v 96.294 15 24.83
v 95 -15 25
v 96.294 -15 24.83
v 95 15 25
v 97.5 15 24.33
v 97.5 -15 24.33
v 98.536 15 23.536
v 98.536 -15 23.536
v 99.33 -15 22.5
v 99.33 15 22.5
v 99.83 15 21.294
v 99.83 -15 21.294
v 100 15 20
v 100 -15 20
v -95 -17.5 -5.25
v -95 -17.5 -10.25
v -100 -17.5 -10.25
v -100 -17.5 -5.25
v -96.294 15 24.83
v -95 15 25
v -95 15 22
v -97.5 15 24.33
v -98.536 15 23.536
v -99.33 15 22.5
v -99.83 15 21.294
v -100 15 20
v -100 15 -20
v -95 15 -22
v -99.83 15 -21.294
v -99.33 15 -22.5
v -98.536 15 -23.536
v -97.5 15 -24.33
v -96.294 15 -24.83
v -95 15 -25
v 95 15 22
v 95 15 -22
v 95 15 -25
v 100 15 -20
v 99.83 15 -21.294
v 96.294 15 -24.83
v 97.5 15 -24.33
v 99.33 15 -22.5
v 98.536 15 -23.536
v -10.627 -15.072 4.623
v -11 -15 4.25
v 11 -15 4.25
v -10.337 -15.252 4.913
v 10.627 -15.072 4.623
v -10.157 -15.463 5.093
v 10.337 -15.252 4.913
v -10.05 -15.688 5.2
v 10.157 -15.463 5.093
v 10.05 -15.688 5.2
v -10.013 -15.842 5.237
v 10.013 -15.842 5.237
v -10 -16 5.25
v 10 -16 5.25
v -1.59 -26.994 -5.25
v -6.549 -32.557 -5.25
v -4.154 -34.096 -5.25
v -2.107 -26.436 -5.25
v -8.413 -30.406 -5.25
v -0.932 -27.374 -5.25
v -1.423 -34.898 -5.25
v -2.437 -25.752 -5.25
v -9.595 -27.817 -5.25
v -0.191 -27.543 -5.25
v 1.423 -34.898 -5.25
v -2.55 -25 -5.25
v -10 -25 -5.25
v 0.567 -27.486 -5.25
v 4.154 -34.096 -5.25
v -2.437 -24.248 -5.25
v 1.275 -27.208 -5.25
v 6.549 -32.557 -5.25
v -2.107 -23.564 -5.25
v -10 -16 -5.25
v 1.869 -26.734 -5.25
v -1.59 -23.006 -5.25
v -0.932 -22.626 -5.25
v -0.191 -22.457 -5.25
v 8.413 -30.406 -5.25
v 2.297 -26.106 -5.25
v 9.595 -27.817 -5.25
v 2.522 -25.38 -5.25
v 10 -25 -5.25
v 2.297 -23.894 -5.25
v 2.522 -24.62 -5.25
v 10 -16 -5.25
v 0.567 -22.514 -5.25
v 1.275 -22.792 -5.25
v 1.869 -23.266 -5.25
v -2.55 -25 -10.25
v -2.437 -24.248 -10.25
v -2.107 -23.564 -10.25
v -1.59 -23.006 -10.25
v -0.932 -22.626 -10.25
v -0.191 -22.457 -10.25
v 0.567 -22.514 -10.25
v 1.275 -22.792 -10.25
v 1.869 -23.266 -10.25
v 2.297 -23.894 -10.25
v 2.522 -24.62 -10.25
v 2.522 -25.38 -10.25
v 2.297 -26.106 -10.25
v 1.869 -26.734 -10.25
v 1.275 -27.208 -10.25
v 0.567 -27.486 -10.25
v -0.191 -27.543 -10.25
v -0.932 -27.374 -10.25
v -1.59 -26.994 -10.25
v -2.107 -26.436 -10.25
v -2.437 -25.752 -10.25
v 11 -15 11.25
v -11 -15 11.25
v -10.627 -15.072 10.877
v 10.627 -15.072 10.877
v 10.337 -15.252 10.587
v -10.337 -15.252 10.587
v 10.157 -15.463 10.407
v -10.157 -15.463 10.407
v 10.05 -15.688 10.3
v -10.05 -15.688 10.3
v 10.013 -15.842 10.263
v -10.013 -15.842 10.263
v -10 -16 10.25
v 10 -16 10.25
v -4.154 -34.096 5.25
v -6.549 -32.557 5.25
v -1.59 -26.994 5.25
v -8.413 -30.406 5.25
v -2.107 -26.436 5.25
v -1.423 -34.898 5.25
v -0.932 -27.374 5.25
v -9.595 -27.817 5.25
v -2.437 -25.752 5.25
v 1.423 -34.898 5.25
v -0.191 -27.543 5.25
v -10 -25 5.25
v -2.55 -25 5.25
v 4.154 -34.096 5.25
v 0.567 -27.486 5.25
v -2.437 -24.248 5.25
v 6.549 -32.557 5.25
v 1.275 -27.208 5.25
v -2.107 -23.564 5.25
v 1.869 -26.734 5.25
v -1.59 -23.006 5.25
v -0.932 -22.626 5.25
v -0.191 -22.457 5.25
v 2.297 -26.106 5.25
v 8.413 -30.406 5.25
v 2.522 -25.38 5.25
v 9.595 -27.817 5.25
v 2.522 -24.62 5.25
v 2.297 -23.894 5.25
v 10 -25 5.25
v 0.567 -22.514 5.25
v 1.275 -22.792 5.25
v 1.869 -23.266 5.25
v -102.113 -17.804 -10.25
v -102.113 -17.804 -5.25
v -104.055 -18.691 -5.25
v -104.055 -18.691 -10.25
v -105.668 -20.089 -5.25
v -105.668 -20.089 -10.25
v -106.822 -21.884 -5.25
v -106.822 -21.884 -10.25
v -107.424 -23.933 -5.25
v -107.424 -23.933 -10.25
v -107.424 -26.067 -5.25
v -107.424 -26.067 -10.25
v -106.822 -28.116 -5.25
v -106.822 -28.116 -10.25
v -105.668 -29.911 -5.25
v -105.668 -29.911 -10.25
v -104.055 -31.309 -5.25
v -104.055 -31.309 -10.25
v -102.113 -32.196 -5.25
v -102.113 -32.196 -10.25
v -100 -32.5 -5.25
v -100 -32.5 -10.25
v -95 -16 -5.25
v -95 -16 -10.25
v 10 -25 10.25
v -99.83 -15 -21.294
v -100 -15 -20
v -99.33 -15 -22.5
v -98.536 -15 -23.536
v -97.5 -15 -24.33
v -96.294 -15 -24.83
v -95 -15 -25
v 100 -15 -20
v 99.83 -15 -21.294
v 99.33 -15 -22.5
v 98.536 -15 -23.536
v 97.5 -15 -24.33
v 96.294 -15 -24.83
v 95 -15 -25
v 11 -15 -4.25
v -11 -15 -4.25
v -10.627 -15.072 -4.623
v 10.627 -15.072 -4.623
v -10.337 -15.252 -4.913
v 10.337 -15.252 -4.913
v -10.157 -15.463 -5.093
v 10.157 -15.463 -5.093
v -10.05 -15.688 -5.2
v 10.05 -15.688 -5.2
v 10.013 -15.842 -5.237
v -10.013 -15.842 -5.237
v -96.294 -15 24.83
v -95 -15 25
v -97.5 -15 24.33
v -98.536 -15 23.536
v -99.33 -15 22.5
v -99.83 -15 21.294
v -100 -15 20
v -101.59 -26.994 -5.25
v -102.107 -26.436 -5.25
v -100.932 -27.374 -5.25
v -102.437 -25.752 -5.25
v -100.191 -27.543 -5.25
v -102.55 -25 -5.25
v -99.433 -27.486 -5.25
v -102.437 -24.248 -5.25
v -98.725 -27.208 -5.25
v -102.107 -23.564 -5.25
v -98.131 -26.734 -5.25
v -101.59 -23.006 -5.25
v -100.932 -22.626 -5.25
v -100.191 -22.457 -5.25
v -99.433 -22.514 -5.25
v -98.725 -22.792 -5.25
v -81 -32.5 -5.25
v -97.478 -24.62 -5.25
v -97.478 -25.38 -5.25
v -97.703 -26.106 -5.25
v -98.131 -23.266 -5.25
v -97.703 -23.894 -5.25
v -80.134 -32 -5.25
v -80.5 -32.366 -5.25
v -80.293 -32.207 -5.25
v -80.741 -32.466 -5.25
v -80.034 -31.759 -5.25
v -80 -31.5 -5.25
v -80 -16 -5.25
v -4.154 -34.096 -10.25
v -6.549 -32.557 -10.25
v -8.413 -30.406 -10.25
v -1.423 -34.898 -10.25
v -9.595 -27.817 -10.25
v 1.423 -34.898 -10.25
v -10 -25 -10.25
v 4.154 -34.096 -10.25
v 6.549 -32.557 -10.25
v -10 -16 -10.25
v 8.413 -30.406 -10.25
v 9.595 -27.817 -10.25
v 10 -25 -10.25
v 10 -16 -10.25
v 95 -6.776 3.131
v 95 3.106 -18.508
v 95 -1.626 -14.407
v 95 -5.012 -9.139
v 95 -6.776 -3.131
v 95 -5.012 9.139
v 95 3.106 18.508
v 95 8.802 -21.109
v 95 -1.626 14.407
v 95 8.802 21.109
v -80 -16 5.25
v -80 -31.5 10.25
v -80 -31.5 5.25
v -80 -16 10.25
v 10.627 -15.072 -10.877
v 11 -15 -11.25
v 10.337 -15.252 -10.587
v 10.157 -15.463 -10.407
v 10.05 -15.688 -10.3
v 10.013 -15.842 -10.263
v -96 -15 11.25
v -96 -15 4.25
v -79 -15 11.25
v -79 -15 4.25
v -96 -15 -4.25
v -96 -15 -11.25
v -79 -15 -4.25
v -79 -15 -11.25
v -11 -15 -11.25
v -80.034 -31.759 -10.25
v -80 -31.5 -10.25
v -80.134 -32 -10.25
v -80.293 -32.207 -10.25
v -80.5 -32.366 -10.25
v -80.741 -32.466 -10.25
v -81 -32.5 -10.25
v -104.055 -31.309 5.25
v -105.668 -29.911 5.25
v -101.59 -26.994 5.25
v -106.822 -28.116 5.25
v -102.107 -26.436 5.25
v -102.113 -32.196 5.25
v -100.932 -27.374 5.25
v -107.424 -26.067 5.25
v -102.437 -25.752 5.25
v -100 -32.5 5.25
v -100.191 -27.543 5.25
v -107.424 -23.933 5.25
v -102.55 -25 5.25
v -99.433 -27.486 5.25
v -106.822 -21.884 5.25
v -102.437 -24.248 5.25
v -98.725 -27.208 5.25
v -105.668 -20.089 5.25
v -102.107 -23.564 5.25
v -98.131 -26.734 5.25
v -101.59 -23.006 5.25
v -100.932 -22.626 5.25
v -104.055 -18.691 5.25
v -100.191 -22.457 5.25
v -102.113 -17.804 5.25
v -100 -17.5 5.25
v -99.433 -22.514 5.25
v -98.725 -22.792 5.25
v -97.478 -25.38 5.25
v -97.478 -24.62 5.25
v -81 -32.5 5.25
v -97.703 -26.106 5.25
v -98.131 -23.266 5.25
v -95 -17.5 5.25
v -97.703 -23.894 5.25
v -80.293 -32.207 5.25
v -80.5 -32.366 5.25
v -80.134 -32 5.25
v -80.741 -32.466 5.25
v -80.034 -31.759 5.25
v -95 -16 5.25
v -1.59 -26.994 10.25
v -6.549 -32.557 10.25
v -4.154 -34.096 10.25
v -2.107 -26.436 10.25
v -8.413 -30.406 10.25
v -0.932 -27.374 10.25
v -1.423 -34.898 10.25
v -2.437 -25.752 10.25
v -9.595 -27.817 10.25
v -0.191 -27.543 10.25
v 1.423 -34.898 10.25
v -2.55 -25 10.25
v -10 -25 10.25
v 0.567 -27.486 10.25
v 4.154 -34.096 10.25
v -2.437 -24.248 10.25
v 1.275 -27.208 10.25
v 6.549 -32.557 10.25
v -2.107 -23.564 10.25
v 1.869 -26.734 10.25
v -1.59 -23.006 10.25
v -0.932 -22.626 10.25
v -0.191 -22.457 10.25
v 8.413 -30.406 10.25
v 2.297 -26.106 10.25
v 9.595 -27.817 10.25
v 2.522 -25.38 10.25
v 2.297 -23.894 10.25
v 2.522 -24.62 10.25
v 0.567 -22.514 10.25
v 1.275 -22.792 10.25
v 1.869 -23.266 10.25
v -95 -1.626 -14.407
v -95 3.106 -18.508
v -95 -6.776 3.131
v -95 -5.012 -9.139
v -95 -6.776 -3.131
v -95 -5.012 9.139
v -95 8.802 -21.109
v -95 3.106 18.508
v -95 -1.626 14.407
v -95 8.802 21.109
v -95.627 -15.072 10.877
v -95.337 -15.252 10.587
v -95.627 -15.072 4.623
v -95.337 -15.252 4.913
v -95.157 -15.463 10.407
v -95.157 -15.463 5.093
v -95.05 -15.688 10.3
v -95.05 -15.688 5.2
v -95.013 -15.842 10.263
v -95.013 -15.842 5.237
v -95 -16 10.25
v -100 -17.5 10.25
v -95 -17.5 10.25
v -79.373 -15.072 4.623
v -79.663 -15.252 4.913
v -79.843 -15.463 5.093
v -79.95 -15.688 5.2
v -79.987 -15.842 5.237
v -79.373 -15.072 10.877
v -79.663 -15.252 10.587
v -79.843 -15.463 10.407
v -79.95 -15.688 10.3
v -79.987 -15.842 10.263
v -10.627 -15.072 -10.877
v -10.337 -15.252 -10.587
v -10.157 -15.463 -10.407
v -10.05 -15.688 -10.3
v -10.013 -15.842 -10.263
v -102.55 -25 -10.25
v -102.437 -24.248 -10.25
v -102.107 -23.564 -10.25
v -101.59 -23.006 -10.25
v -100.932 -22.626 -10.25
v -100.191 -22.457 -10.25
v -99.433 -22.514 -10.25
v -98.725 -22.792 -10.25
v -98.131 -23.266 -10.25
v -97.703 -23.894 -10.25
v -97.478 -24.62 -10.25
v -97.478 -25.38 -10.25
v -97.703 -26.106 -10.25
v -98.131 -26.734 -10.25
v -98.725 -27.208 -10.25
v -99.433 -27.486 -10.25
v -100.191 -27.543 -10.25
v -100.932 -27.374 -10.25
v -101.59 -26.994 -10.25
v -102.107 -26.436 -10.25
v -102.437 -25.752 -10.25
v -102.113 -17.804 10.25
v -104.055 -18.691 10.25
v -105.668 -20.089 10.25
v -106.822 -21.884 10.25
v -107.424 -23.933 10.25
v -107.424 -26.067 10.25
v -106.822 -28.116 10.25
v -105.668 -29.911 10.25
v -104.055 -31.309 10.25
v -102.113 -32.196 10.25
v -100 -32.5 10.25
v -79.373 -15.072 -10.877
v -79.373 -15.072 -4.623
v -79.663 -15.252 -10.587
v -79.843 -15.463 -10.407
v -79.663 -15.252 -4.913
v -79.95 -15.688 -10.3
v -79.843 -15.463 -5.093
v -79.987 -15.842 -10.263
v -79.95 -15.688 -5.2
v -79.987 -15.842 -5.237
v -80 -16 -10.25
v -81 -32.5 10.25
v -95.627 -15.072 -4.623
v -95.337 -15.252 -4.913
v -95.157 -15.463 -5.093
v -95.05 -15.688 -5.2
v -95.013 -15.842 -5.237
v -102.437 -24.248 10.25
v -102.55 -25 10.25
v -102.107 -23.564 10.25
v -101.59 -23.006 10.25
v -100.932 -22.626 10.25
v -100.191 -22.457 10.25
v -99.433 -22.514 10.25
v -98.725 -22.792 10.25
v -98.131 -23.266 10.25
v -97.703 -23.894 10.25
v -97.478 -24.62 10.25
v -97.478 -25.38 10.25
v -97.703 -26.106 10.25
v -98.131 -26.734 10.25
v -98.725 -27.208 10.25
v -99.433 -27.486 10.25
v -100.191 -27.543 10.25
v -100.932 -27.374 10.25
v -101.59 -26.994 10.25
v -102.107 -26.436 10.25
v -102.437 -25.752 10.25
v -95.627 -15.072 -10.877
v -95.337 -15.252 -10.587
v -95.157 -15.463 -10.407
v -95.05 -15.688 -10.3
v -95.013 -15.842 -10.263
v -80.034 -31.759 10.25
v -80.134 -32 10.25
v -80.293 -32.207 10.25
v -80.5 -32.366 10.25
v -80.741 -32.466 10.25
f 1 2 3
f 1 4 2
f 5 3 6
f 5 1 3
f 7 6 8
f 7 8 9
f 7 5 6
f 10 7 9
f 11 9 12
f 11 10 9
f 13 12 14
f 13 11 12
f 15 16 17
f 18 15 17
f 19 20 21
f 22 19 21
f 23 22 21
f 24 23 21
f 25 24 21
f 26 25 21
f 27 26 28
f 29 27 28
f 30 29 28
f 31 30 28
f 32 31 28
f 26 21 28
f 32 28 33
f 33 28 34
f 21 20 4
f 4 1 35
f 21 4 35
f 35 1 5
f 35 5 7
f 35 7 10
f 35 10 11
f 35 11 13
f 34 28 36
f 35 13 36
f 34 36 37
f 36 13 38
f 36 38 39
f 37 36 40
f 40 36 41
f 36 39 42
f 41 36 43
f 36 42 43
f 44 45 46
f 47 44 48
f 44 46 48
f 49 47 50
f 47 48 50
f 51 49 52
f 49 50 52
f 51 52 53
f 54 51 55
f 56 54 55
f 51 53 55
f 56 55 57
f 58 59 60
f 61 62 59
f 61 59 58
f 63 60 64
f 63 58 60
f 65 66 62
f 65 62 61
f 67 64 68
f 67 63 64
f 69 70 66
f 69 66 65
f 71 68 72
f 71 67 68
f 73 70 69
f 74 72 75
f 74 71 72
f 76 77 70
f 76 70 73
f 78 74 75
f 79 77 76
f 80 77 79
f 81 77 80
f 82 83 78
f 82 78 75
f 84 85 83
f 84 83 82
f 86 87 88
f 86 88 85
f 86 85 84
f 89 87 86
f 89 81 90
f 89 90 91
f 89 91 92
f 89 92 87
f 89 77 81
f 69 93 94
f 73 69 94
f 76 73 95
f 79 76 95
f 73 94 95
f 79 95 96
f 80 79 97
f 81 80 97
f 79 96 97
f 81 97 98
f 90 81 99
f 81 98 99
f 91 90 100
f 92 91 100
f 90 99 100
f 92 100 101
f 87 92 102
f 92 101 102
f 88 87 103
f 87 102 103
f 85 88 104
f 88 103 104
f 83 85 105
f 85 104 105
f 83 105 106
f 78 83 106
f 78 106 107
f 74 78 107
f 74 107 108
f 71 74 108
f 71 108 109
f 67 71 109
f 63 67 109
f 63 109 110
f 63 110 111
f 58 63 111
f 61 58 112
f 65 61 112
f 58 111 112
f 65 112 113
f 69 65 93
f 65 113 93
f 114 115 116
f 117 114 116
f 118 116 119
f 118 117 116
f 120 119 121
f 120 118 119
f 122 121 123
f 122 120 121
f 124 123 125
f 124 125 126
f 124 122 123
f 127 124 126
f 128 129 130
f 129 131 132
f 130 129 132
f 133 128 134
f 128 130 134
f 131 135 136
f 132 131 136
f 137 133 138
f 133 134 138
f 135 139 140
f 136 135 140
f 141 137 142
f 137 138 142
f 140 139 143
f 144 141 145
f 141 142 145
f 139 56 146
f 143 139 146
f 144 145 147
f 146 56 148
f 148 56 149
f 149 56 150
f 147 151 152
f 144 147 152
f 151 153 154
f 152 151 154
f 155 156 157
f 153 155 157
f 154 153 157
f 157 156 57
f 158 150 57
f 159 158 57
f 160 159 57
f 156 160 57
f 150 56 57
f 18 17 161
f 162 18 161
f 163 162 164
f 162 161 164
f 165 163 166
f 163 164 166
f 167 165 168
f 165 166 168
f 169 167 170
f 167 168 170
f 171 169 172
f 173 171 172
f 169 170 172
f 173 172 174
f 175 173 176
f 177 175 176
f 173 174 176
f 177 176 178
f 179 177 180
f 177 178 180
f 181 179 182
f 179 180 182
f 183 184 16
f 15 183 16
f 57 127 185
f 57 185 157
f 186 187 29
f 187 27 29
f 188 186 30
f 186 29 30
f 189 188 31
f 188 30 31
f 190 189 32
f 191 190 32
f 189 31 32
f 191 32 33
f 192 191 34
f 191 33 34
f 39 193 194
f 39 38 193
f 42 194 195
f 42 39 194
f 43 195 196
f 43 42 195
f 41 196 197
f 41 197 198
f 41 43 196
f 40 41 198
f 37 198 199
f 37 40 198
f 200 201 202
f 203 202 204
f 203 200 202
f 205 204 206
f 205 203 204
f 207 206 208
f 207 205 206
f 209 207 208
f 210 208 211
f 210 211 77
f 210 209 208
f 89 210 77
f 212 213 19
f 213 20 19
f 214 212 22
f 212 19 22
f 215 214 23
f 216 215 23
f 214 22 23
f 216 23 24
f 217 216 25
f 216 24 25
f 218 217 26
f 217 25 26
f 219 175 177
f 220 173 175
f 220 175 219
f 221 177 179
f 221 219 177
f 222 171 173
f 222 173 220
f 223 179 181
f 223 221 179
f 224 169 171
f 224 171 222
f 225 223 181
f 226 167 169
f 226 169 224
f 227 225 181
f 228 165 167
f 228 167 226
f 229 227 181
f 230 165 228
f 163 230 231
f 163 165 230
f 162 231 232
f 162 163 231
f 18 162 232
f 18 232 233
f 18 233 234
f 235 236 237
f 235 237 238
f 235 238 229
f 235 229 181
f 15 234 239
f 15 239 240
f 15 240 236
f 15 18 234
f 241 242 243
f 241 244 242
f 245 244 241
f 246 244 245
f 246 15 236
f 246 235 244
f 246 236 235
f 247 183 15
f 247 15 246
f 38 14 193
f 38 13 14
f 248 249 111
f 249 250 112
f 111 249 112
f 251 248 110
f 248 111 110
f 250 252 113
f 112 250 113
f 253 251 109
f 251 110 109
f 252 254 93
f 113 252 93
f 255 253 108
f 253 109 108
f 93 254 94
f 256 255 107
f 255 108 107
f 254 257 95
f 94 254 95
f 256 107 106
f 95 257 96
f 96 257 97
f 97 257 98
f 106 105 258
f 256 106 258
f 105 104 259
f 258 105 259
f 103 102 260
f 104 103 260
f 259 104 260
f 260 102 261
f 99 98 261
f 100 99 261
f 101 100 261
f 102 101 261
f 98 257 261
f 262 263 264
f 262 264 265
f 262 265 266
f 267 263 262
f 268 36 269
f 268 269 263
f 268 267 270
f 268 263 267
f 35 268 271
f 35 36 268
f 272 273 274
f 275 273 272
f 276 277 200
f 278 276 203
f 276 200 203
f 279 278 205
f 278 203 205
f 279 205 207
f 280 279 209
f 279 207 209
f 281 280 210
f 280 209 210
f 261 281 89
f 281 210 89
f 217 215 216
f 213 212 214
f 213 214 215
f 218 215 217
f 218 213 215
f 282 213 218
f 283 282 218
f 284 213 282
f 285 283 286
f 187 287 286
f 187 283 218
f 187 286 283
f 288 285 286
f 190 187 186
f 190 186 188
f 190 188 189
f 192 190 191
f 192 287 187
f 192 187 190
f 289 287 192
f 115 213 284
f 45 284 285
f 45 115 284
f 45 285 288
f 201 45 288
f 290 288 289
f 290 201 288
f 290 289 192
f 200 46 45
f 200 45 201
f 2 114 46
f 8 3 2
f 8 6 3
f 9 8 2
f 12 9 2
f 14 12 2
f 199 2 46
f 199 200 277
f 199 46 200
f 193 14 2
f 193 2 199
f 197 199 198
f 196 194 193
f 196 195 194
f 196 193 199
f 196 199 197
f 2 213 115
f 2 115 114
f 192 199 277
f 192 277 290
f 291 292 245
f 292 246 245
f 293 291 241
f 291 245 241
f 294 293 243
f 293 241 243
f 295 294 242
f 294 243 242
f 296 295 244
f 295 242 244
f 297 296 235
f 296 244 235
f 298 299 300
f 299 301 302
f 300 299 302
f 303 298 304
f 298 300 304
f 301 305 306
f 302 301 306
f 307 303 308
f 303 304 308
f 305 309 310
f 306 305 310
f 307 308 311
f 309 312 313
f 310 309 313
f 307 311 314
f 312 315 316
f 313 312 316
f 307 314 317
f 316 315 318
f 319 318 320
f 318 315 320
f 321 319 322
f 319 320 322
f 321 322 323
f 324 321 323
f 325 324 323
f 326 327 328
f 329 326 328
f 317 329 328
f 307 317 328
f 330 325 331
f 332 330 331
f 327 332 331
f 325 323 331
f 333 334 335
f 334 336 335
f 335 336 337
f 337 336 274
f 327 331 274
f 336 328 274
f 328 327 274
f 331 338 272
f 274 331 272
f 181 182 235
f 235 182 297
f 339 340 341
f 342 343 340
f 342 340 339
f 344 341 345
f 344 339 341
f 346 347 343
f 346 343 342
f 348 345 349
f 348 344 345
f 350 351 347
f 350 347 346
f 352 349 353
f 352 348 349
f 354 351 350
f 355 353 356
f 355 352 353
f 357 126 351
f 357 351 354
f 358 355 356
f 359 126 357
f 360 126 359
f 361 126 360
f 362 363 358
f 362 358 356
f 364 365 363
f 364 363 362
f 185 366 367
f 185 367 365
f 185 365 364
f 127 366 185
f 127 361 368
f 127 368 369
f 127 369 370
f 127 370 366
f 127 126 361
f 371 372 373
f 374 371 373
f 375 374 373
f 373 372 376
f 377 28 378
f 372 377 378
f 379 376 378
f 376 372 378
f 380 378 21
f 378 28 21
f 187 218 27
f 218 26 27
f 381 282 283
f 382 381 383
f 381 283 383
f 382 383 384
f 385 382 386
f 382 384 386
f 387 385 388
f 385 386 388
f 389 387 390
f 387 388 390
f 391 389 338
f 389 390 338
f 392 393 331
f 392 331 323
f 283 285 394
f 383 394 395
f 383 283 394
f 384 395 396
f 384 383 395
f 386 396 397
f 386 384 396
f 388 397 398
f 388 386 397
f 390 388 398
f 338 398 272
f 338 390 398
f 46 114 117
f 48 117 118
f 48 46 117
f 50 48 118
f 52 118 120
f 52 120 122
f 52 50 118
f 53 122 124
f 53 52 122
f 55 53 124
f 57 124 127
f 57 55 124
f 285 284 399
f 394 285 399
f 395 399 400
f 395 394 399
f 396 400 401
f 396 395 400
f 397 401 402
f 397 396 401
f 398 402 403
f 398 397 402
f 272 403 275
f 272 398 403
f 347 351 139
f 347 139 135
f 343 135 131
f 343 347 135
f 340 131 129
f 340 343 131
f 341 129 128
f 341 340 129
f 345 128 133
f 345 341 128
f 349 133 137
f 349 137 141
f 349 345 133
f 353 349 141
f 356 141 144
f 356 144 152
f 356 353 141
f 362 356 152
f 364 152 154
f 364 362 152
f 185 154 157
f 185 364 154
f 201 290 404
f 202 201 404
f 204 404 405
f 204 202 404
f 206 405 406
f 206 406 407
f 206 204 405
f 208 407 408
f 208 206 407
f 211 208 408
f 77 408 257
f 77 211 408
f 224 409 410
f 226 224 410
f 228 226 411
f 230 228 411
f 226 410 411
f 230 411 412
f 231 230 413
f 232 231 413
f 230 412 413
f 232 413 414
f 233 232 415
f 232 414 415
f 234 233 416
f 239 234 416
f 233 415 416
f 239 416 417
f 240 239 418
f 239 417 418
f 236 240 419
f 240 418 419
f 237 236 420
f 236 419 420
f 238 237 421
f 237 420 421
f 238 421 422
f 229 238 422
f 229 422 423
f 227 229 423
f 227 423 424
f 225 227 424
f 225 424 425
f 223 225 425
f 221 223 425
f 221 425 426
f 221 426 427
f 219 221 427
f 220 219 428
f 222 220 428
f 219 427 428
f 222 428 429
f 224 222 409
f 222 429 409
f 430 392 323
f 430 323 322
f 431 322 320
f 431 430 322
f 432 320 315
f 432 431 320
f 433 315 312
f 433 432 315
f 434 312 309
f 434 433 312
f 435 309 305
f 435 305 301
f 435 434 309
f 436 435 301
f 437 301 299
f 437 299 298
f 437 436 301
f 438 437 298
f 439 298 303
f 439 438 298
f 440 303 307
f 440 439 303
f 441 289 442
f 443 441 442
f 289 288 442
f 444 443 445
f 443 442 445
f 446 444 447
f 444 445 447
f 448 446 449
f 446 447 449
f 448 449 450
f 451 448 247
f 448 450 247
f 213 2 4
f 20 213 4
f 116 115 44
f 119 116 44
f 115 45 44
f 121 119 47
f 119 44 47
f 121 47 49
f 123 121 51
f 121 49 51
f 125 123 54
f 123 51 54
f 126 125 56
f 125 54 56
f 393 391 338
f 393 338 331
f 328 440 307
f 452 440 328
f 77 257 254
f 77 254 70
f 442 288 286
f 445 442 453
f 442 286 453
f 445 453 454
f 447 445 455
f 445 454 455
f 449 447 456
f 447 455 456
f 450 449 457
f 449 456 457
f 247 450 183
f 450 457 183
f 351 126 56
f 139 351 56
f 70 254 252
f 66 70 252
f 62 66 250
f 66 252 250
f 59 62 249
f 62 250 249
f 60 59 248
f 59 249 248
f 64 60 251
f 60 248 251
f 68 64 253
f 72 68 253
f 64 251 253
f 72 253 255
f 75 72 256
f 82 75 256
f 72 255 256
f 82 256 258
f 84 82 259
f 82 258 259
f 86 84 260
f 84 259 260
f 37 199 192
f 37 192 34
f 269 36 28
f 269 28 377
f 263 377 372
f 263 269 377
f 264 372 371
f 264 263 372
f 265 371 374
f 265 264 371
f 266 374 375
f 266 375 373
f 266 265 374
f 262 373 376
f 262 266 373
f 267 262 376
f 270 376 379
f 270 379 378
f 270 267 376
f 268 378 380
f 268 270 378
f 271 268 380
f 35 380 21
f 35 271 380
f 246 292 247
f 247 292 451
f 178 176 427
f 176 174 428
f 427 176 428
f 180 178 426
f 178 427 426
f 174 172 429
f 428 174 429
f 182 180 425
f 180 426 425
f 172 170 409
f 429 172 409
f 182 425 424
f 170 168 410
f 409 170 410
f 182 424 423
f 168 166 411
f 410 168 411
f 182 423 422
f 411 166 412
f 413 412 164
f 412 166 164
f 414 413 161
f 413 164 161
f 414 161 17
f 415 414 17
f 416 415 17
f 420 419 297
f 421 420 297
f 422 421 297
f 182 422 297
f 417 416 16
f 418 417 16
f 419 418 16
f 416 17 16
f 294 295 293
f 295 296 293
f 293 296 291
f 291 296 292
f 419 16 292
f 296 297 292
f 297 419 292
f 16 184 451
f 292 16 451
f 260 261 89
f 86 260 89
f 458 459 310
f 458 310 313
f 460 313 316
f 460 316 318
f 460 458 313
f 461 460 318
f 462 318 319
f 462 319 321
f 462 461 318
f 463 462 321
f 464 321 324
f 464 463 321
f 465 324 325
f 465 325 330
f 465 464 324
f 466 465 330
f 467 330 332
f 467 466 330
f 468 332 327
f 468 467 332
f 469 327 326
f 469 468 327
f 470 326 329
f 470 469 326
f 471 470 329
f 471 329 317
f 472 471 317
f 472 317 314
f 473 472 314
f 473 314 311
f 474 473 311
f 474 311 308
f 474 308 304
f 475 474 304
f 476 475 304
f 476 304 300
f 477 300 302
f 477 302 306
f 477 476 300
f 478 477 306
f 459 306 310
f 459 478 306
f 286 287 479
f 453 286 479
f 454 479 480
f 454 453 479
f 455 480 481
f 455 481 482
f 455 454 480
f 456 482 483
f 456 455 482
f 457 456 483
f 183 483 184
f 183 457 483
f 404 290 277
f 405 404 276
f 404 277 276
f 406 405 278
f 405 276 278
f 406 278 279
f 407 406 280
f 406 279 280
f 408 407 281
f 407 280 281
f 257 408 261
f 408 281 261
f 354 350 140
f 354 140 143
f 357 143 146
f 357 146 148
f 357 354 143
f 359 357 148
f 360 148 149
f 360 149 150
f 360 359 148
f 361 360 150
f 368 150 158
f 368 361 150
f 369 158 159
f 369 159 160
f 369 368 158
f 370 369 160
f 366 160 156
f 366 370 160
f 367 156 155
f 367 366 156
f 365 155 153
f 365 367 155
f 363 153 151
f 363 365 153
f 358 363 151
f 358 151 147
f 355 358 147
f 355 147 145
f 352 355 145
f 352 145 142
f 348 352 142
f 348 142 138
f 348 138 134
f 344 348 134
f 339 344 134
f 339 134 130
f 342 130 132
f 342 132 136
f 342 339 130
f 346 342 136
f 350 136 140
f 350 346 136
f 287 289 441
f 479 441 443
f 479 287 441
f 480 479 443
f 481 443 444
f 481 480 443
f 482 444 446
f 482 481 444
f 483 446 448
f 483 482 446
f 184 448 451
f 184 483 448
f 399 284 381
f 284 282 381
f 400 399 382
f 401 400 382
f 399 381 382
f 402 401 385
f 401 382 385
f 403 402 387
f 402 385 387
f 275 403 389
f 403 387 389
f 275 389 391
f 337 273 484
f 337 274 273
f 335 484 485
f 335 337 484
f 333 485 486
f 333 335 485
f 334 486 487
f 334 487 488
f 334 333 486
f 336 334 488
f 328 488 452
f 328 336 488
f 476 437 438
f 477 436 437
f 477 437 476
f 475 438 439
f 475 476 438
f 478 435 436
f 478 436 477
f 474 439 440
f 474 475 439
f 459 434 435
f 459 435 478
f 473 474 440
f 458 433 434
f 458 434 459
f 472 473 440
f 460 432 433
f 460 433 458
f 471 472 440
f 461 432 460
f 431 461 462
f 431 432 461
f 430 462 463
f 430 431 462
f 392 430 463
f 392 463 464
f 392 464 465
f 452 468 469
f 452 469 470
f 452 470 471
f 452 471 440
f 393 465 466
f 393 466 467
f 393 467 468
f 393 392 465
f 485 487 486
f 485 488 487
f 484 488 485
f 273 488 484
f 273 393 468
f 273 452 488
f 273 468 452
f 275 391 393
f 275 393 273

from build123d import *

# Parameters (mm, degrees)
SKETCH2_W           = 50
SKETCH2_H           = 30
BOSS_EXTRUDE2_DEPTH = 100
CUT_EXTRUDE1_DEPTH  = 95
SKETCH4_W           = 20
SKETCH4_H           = 5
BOSS_EXTRUDE3_DEPTH = 10
BOSS_EXTRUDE4_DEPTH = 5
SKETCH6_R           = 2.55
CUT_EXTRUDE2_DEPTH  = 5
SKETCH9_R           = 2.55
BOSS_EXTRUDE6_DEPTH = 5
FILLET1_R           = 5
FILLET3_R           = 1


with BuildPart() as part:
    # Sketch2 → Boss-Extrude2 (new body)
    with BuildSketch(Plane(origin=(0, 0, 0), x_dir=(0, 0, -1), z_dir=(1, 0, 0))):
        Rectangle(SKETCH2_W, SKETCH2_H)
    boss_extrude2 = extrude(amount=BOSS_EXTRUDE2_DEPTH)

    # Sketch3 → Cut-Extrude1 (cut)
    with BuildSketch(Plane.ZY):
        with BuildLine():
            Line((22, 15), (-22, 15))
            ThreePointArc((-22, 15), (0, -7), (22, 15))
        make_face()
    cut_extrude1 = extrude(amount=-CUT_EXTRUDE1_DEPTH, mode=Mode.SUBTRACT)

    # Mirror7: Boss-Extrude2, Cut-Extrude1 across plane
    add(boss_extrude2.mirror(Plane(origin=(0, 0, 0), x_dir=(0, 0, 1), z_dir=(1, 0, 0))))
    add(cut_extrude1.mirror(Plane(origin=(0, 0, 0), x_dir=(0, 0, 1), z_dir=(1, 0, 0))), mode=Mode.SUBTRACT)

    # Sketch4 → Boss-Extrude3 (add)
    with BuildSketch(Plane.XZ.offset(15)):
        with Locations((0, -7.75)):
            Rectangle(SKETCH4_W, SKETCH4_H)
    boss_extrude3 = extrude(amount=BOSS_EXTRUDE3_DEPTH)

    # Sketch5 → Boss-Extrude4 (add)
    with BuildSketch(Plane(origin=(0, 0, -10.25), x_dir=(-1, 0, 0), z_dir=(0, 0, -1))):
        with BuildLine():
            Line((-10, -25), (10, -25))
            ThreePointArc((10, -25), (0, -35), (-10, -25))
        make_face()
    boss_extrude4 = extrude(amount=-BOSS_EXTRUDE4_DEPTH)

    # Sketch6 → Cut-Extrude2 (cut)
    with BuildSketch(Plane(origin=(0, 0, -10.25), x_dir=(-1, 0, 0), z_dir=(0, 0, -1))):
        with Locations((0, -25)):
            Circle(SKETCH6_R)
    cut_extrude2 = extrude(amount=-CUT_EXTRUDE2_DEPTH, mode=Mode.SUBTRACT)

    # Mirror12: Boss-Extrude3, Boss-Extrude4, Cut-Extrude2 across plane
    add(boss_extrude3.mirror(Plane.XY))
    add(boss_extrude4.mirror(Plane.XY))
    add(cut_extrude2.mirror(Plane.XY), mode=Mode.SUBTRACT)

    # Sketch9 → Boss-Extrude6 (add)
    with BuildSketch(Plane(origin=(0, 0, -10.25), x_dir=(-1, 0, 0), z_dir=(0, 0, -1))):
        with BuildLine():
            Line((80, -15), (95, -15))
            Line((95, -15), (95, -17.5))
            Line((95, -17.5), (100, -17.5))
            ThreePointArc((100, -17.5), (107.5, -25), (100, -32.5))
            Line((100, -32.5), (80, -32.5))
            Line((80, -32.5), (80, -15))
        make_face()
        with Locations((100, -25)):
            Circle(SKETCH9_R, mode=Mode.SUBTRACT)
    boss_extrude6 = extrude(amount=-BOSS_EXTRUDE6_DEPTH)

    # Mirror13: Boss-Extrude6 across plane
    add(boss_extrude6.mirror(Plane.XY))

    # Fillet1
    fillet1_edges = [part.edges().sort_by_distance(p)[0] for p in [
        (100, 0, 25),
        (-100, 0, -25),
        (-100, 0, 25),
        (100, 0, -25),
    ]]
    fillet(fillet1_edges, radius=FILLET1_R)

    # Fillet3
    fillet3_edges = [part.edges().sort_by_distance(p)[0] for p in [
        (-87.5, -15, -10.25),
        (-87.5, -15, 5.25),
        (-87.5, -15, 10.25),
        (-95, -15, 7.75),
        (-80, -15, 7.75),
        (-80, -32.5, 7.75),
        (10, -15, -7.75),
        (0, -15, -5.25),
        (-10, -15, -7.75),
        (0, -15, -10.25),
        (10, -15, 7.75),
        (0, -15, 5.25),
        (-10, -15, 7.75),
        (0, -15, 10.25),
        (-95, -15, -7.75),
        (-80, -32.5, -7.75),
        (-87.5, -15, -5.25),
        (-80, -15, -7.75),
    ]]
    fillet(fillet3_edges, radius=FILLET3_R)


solid = part.part
